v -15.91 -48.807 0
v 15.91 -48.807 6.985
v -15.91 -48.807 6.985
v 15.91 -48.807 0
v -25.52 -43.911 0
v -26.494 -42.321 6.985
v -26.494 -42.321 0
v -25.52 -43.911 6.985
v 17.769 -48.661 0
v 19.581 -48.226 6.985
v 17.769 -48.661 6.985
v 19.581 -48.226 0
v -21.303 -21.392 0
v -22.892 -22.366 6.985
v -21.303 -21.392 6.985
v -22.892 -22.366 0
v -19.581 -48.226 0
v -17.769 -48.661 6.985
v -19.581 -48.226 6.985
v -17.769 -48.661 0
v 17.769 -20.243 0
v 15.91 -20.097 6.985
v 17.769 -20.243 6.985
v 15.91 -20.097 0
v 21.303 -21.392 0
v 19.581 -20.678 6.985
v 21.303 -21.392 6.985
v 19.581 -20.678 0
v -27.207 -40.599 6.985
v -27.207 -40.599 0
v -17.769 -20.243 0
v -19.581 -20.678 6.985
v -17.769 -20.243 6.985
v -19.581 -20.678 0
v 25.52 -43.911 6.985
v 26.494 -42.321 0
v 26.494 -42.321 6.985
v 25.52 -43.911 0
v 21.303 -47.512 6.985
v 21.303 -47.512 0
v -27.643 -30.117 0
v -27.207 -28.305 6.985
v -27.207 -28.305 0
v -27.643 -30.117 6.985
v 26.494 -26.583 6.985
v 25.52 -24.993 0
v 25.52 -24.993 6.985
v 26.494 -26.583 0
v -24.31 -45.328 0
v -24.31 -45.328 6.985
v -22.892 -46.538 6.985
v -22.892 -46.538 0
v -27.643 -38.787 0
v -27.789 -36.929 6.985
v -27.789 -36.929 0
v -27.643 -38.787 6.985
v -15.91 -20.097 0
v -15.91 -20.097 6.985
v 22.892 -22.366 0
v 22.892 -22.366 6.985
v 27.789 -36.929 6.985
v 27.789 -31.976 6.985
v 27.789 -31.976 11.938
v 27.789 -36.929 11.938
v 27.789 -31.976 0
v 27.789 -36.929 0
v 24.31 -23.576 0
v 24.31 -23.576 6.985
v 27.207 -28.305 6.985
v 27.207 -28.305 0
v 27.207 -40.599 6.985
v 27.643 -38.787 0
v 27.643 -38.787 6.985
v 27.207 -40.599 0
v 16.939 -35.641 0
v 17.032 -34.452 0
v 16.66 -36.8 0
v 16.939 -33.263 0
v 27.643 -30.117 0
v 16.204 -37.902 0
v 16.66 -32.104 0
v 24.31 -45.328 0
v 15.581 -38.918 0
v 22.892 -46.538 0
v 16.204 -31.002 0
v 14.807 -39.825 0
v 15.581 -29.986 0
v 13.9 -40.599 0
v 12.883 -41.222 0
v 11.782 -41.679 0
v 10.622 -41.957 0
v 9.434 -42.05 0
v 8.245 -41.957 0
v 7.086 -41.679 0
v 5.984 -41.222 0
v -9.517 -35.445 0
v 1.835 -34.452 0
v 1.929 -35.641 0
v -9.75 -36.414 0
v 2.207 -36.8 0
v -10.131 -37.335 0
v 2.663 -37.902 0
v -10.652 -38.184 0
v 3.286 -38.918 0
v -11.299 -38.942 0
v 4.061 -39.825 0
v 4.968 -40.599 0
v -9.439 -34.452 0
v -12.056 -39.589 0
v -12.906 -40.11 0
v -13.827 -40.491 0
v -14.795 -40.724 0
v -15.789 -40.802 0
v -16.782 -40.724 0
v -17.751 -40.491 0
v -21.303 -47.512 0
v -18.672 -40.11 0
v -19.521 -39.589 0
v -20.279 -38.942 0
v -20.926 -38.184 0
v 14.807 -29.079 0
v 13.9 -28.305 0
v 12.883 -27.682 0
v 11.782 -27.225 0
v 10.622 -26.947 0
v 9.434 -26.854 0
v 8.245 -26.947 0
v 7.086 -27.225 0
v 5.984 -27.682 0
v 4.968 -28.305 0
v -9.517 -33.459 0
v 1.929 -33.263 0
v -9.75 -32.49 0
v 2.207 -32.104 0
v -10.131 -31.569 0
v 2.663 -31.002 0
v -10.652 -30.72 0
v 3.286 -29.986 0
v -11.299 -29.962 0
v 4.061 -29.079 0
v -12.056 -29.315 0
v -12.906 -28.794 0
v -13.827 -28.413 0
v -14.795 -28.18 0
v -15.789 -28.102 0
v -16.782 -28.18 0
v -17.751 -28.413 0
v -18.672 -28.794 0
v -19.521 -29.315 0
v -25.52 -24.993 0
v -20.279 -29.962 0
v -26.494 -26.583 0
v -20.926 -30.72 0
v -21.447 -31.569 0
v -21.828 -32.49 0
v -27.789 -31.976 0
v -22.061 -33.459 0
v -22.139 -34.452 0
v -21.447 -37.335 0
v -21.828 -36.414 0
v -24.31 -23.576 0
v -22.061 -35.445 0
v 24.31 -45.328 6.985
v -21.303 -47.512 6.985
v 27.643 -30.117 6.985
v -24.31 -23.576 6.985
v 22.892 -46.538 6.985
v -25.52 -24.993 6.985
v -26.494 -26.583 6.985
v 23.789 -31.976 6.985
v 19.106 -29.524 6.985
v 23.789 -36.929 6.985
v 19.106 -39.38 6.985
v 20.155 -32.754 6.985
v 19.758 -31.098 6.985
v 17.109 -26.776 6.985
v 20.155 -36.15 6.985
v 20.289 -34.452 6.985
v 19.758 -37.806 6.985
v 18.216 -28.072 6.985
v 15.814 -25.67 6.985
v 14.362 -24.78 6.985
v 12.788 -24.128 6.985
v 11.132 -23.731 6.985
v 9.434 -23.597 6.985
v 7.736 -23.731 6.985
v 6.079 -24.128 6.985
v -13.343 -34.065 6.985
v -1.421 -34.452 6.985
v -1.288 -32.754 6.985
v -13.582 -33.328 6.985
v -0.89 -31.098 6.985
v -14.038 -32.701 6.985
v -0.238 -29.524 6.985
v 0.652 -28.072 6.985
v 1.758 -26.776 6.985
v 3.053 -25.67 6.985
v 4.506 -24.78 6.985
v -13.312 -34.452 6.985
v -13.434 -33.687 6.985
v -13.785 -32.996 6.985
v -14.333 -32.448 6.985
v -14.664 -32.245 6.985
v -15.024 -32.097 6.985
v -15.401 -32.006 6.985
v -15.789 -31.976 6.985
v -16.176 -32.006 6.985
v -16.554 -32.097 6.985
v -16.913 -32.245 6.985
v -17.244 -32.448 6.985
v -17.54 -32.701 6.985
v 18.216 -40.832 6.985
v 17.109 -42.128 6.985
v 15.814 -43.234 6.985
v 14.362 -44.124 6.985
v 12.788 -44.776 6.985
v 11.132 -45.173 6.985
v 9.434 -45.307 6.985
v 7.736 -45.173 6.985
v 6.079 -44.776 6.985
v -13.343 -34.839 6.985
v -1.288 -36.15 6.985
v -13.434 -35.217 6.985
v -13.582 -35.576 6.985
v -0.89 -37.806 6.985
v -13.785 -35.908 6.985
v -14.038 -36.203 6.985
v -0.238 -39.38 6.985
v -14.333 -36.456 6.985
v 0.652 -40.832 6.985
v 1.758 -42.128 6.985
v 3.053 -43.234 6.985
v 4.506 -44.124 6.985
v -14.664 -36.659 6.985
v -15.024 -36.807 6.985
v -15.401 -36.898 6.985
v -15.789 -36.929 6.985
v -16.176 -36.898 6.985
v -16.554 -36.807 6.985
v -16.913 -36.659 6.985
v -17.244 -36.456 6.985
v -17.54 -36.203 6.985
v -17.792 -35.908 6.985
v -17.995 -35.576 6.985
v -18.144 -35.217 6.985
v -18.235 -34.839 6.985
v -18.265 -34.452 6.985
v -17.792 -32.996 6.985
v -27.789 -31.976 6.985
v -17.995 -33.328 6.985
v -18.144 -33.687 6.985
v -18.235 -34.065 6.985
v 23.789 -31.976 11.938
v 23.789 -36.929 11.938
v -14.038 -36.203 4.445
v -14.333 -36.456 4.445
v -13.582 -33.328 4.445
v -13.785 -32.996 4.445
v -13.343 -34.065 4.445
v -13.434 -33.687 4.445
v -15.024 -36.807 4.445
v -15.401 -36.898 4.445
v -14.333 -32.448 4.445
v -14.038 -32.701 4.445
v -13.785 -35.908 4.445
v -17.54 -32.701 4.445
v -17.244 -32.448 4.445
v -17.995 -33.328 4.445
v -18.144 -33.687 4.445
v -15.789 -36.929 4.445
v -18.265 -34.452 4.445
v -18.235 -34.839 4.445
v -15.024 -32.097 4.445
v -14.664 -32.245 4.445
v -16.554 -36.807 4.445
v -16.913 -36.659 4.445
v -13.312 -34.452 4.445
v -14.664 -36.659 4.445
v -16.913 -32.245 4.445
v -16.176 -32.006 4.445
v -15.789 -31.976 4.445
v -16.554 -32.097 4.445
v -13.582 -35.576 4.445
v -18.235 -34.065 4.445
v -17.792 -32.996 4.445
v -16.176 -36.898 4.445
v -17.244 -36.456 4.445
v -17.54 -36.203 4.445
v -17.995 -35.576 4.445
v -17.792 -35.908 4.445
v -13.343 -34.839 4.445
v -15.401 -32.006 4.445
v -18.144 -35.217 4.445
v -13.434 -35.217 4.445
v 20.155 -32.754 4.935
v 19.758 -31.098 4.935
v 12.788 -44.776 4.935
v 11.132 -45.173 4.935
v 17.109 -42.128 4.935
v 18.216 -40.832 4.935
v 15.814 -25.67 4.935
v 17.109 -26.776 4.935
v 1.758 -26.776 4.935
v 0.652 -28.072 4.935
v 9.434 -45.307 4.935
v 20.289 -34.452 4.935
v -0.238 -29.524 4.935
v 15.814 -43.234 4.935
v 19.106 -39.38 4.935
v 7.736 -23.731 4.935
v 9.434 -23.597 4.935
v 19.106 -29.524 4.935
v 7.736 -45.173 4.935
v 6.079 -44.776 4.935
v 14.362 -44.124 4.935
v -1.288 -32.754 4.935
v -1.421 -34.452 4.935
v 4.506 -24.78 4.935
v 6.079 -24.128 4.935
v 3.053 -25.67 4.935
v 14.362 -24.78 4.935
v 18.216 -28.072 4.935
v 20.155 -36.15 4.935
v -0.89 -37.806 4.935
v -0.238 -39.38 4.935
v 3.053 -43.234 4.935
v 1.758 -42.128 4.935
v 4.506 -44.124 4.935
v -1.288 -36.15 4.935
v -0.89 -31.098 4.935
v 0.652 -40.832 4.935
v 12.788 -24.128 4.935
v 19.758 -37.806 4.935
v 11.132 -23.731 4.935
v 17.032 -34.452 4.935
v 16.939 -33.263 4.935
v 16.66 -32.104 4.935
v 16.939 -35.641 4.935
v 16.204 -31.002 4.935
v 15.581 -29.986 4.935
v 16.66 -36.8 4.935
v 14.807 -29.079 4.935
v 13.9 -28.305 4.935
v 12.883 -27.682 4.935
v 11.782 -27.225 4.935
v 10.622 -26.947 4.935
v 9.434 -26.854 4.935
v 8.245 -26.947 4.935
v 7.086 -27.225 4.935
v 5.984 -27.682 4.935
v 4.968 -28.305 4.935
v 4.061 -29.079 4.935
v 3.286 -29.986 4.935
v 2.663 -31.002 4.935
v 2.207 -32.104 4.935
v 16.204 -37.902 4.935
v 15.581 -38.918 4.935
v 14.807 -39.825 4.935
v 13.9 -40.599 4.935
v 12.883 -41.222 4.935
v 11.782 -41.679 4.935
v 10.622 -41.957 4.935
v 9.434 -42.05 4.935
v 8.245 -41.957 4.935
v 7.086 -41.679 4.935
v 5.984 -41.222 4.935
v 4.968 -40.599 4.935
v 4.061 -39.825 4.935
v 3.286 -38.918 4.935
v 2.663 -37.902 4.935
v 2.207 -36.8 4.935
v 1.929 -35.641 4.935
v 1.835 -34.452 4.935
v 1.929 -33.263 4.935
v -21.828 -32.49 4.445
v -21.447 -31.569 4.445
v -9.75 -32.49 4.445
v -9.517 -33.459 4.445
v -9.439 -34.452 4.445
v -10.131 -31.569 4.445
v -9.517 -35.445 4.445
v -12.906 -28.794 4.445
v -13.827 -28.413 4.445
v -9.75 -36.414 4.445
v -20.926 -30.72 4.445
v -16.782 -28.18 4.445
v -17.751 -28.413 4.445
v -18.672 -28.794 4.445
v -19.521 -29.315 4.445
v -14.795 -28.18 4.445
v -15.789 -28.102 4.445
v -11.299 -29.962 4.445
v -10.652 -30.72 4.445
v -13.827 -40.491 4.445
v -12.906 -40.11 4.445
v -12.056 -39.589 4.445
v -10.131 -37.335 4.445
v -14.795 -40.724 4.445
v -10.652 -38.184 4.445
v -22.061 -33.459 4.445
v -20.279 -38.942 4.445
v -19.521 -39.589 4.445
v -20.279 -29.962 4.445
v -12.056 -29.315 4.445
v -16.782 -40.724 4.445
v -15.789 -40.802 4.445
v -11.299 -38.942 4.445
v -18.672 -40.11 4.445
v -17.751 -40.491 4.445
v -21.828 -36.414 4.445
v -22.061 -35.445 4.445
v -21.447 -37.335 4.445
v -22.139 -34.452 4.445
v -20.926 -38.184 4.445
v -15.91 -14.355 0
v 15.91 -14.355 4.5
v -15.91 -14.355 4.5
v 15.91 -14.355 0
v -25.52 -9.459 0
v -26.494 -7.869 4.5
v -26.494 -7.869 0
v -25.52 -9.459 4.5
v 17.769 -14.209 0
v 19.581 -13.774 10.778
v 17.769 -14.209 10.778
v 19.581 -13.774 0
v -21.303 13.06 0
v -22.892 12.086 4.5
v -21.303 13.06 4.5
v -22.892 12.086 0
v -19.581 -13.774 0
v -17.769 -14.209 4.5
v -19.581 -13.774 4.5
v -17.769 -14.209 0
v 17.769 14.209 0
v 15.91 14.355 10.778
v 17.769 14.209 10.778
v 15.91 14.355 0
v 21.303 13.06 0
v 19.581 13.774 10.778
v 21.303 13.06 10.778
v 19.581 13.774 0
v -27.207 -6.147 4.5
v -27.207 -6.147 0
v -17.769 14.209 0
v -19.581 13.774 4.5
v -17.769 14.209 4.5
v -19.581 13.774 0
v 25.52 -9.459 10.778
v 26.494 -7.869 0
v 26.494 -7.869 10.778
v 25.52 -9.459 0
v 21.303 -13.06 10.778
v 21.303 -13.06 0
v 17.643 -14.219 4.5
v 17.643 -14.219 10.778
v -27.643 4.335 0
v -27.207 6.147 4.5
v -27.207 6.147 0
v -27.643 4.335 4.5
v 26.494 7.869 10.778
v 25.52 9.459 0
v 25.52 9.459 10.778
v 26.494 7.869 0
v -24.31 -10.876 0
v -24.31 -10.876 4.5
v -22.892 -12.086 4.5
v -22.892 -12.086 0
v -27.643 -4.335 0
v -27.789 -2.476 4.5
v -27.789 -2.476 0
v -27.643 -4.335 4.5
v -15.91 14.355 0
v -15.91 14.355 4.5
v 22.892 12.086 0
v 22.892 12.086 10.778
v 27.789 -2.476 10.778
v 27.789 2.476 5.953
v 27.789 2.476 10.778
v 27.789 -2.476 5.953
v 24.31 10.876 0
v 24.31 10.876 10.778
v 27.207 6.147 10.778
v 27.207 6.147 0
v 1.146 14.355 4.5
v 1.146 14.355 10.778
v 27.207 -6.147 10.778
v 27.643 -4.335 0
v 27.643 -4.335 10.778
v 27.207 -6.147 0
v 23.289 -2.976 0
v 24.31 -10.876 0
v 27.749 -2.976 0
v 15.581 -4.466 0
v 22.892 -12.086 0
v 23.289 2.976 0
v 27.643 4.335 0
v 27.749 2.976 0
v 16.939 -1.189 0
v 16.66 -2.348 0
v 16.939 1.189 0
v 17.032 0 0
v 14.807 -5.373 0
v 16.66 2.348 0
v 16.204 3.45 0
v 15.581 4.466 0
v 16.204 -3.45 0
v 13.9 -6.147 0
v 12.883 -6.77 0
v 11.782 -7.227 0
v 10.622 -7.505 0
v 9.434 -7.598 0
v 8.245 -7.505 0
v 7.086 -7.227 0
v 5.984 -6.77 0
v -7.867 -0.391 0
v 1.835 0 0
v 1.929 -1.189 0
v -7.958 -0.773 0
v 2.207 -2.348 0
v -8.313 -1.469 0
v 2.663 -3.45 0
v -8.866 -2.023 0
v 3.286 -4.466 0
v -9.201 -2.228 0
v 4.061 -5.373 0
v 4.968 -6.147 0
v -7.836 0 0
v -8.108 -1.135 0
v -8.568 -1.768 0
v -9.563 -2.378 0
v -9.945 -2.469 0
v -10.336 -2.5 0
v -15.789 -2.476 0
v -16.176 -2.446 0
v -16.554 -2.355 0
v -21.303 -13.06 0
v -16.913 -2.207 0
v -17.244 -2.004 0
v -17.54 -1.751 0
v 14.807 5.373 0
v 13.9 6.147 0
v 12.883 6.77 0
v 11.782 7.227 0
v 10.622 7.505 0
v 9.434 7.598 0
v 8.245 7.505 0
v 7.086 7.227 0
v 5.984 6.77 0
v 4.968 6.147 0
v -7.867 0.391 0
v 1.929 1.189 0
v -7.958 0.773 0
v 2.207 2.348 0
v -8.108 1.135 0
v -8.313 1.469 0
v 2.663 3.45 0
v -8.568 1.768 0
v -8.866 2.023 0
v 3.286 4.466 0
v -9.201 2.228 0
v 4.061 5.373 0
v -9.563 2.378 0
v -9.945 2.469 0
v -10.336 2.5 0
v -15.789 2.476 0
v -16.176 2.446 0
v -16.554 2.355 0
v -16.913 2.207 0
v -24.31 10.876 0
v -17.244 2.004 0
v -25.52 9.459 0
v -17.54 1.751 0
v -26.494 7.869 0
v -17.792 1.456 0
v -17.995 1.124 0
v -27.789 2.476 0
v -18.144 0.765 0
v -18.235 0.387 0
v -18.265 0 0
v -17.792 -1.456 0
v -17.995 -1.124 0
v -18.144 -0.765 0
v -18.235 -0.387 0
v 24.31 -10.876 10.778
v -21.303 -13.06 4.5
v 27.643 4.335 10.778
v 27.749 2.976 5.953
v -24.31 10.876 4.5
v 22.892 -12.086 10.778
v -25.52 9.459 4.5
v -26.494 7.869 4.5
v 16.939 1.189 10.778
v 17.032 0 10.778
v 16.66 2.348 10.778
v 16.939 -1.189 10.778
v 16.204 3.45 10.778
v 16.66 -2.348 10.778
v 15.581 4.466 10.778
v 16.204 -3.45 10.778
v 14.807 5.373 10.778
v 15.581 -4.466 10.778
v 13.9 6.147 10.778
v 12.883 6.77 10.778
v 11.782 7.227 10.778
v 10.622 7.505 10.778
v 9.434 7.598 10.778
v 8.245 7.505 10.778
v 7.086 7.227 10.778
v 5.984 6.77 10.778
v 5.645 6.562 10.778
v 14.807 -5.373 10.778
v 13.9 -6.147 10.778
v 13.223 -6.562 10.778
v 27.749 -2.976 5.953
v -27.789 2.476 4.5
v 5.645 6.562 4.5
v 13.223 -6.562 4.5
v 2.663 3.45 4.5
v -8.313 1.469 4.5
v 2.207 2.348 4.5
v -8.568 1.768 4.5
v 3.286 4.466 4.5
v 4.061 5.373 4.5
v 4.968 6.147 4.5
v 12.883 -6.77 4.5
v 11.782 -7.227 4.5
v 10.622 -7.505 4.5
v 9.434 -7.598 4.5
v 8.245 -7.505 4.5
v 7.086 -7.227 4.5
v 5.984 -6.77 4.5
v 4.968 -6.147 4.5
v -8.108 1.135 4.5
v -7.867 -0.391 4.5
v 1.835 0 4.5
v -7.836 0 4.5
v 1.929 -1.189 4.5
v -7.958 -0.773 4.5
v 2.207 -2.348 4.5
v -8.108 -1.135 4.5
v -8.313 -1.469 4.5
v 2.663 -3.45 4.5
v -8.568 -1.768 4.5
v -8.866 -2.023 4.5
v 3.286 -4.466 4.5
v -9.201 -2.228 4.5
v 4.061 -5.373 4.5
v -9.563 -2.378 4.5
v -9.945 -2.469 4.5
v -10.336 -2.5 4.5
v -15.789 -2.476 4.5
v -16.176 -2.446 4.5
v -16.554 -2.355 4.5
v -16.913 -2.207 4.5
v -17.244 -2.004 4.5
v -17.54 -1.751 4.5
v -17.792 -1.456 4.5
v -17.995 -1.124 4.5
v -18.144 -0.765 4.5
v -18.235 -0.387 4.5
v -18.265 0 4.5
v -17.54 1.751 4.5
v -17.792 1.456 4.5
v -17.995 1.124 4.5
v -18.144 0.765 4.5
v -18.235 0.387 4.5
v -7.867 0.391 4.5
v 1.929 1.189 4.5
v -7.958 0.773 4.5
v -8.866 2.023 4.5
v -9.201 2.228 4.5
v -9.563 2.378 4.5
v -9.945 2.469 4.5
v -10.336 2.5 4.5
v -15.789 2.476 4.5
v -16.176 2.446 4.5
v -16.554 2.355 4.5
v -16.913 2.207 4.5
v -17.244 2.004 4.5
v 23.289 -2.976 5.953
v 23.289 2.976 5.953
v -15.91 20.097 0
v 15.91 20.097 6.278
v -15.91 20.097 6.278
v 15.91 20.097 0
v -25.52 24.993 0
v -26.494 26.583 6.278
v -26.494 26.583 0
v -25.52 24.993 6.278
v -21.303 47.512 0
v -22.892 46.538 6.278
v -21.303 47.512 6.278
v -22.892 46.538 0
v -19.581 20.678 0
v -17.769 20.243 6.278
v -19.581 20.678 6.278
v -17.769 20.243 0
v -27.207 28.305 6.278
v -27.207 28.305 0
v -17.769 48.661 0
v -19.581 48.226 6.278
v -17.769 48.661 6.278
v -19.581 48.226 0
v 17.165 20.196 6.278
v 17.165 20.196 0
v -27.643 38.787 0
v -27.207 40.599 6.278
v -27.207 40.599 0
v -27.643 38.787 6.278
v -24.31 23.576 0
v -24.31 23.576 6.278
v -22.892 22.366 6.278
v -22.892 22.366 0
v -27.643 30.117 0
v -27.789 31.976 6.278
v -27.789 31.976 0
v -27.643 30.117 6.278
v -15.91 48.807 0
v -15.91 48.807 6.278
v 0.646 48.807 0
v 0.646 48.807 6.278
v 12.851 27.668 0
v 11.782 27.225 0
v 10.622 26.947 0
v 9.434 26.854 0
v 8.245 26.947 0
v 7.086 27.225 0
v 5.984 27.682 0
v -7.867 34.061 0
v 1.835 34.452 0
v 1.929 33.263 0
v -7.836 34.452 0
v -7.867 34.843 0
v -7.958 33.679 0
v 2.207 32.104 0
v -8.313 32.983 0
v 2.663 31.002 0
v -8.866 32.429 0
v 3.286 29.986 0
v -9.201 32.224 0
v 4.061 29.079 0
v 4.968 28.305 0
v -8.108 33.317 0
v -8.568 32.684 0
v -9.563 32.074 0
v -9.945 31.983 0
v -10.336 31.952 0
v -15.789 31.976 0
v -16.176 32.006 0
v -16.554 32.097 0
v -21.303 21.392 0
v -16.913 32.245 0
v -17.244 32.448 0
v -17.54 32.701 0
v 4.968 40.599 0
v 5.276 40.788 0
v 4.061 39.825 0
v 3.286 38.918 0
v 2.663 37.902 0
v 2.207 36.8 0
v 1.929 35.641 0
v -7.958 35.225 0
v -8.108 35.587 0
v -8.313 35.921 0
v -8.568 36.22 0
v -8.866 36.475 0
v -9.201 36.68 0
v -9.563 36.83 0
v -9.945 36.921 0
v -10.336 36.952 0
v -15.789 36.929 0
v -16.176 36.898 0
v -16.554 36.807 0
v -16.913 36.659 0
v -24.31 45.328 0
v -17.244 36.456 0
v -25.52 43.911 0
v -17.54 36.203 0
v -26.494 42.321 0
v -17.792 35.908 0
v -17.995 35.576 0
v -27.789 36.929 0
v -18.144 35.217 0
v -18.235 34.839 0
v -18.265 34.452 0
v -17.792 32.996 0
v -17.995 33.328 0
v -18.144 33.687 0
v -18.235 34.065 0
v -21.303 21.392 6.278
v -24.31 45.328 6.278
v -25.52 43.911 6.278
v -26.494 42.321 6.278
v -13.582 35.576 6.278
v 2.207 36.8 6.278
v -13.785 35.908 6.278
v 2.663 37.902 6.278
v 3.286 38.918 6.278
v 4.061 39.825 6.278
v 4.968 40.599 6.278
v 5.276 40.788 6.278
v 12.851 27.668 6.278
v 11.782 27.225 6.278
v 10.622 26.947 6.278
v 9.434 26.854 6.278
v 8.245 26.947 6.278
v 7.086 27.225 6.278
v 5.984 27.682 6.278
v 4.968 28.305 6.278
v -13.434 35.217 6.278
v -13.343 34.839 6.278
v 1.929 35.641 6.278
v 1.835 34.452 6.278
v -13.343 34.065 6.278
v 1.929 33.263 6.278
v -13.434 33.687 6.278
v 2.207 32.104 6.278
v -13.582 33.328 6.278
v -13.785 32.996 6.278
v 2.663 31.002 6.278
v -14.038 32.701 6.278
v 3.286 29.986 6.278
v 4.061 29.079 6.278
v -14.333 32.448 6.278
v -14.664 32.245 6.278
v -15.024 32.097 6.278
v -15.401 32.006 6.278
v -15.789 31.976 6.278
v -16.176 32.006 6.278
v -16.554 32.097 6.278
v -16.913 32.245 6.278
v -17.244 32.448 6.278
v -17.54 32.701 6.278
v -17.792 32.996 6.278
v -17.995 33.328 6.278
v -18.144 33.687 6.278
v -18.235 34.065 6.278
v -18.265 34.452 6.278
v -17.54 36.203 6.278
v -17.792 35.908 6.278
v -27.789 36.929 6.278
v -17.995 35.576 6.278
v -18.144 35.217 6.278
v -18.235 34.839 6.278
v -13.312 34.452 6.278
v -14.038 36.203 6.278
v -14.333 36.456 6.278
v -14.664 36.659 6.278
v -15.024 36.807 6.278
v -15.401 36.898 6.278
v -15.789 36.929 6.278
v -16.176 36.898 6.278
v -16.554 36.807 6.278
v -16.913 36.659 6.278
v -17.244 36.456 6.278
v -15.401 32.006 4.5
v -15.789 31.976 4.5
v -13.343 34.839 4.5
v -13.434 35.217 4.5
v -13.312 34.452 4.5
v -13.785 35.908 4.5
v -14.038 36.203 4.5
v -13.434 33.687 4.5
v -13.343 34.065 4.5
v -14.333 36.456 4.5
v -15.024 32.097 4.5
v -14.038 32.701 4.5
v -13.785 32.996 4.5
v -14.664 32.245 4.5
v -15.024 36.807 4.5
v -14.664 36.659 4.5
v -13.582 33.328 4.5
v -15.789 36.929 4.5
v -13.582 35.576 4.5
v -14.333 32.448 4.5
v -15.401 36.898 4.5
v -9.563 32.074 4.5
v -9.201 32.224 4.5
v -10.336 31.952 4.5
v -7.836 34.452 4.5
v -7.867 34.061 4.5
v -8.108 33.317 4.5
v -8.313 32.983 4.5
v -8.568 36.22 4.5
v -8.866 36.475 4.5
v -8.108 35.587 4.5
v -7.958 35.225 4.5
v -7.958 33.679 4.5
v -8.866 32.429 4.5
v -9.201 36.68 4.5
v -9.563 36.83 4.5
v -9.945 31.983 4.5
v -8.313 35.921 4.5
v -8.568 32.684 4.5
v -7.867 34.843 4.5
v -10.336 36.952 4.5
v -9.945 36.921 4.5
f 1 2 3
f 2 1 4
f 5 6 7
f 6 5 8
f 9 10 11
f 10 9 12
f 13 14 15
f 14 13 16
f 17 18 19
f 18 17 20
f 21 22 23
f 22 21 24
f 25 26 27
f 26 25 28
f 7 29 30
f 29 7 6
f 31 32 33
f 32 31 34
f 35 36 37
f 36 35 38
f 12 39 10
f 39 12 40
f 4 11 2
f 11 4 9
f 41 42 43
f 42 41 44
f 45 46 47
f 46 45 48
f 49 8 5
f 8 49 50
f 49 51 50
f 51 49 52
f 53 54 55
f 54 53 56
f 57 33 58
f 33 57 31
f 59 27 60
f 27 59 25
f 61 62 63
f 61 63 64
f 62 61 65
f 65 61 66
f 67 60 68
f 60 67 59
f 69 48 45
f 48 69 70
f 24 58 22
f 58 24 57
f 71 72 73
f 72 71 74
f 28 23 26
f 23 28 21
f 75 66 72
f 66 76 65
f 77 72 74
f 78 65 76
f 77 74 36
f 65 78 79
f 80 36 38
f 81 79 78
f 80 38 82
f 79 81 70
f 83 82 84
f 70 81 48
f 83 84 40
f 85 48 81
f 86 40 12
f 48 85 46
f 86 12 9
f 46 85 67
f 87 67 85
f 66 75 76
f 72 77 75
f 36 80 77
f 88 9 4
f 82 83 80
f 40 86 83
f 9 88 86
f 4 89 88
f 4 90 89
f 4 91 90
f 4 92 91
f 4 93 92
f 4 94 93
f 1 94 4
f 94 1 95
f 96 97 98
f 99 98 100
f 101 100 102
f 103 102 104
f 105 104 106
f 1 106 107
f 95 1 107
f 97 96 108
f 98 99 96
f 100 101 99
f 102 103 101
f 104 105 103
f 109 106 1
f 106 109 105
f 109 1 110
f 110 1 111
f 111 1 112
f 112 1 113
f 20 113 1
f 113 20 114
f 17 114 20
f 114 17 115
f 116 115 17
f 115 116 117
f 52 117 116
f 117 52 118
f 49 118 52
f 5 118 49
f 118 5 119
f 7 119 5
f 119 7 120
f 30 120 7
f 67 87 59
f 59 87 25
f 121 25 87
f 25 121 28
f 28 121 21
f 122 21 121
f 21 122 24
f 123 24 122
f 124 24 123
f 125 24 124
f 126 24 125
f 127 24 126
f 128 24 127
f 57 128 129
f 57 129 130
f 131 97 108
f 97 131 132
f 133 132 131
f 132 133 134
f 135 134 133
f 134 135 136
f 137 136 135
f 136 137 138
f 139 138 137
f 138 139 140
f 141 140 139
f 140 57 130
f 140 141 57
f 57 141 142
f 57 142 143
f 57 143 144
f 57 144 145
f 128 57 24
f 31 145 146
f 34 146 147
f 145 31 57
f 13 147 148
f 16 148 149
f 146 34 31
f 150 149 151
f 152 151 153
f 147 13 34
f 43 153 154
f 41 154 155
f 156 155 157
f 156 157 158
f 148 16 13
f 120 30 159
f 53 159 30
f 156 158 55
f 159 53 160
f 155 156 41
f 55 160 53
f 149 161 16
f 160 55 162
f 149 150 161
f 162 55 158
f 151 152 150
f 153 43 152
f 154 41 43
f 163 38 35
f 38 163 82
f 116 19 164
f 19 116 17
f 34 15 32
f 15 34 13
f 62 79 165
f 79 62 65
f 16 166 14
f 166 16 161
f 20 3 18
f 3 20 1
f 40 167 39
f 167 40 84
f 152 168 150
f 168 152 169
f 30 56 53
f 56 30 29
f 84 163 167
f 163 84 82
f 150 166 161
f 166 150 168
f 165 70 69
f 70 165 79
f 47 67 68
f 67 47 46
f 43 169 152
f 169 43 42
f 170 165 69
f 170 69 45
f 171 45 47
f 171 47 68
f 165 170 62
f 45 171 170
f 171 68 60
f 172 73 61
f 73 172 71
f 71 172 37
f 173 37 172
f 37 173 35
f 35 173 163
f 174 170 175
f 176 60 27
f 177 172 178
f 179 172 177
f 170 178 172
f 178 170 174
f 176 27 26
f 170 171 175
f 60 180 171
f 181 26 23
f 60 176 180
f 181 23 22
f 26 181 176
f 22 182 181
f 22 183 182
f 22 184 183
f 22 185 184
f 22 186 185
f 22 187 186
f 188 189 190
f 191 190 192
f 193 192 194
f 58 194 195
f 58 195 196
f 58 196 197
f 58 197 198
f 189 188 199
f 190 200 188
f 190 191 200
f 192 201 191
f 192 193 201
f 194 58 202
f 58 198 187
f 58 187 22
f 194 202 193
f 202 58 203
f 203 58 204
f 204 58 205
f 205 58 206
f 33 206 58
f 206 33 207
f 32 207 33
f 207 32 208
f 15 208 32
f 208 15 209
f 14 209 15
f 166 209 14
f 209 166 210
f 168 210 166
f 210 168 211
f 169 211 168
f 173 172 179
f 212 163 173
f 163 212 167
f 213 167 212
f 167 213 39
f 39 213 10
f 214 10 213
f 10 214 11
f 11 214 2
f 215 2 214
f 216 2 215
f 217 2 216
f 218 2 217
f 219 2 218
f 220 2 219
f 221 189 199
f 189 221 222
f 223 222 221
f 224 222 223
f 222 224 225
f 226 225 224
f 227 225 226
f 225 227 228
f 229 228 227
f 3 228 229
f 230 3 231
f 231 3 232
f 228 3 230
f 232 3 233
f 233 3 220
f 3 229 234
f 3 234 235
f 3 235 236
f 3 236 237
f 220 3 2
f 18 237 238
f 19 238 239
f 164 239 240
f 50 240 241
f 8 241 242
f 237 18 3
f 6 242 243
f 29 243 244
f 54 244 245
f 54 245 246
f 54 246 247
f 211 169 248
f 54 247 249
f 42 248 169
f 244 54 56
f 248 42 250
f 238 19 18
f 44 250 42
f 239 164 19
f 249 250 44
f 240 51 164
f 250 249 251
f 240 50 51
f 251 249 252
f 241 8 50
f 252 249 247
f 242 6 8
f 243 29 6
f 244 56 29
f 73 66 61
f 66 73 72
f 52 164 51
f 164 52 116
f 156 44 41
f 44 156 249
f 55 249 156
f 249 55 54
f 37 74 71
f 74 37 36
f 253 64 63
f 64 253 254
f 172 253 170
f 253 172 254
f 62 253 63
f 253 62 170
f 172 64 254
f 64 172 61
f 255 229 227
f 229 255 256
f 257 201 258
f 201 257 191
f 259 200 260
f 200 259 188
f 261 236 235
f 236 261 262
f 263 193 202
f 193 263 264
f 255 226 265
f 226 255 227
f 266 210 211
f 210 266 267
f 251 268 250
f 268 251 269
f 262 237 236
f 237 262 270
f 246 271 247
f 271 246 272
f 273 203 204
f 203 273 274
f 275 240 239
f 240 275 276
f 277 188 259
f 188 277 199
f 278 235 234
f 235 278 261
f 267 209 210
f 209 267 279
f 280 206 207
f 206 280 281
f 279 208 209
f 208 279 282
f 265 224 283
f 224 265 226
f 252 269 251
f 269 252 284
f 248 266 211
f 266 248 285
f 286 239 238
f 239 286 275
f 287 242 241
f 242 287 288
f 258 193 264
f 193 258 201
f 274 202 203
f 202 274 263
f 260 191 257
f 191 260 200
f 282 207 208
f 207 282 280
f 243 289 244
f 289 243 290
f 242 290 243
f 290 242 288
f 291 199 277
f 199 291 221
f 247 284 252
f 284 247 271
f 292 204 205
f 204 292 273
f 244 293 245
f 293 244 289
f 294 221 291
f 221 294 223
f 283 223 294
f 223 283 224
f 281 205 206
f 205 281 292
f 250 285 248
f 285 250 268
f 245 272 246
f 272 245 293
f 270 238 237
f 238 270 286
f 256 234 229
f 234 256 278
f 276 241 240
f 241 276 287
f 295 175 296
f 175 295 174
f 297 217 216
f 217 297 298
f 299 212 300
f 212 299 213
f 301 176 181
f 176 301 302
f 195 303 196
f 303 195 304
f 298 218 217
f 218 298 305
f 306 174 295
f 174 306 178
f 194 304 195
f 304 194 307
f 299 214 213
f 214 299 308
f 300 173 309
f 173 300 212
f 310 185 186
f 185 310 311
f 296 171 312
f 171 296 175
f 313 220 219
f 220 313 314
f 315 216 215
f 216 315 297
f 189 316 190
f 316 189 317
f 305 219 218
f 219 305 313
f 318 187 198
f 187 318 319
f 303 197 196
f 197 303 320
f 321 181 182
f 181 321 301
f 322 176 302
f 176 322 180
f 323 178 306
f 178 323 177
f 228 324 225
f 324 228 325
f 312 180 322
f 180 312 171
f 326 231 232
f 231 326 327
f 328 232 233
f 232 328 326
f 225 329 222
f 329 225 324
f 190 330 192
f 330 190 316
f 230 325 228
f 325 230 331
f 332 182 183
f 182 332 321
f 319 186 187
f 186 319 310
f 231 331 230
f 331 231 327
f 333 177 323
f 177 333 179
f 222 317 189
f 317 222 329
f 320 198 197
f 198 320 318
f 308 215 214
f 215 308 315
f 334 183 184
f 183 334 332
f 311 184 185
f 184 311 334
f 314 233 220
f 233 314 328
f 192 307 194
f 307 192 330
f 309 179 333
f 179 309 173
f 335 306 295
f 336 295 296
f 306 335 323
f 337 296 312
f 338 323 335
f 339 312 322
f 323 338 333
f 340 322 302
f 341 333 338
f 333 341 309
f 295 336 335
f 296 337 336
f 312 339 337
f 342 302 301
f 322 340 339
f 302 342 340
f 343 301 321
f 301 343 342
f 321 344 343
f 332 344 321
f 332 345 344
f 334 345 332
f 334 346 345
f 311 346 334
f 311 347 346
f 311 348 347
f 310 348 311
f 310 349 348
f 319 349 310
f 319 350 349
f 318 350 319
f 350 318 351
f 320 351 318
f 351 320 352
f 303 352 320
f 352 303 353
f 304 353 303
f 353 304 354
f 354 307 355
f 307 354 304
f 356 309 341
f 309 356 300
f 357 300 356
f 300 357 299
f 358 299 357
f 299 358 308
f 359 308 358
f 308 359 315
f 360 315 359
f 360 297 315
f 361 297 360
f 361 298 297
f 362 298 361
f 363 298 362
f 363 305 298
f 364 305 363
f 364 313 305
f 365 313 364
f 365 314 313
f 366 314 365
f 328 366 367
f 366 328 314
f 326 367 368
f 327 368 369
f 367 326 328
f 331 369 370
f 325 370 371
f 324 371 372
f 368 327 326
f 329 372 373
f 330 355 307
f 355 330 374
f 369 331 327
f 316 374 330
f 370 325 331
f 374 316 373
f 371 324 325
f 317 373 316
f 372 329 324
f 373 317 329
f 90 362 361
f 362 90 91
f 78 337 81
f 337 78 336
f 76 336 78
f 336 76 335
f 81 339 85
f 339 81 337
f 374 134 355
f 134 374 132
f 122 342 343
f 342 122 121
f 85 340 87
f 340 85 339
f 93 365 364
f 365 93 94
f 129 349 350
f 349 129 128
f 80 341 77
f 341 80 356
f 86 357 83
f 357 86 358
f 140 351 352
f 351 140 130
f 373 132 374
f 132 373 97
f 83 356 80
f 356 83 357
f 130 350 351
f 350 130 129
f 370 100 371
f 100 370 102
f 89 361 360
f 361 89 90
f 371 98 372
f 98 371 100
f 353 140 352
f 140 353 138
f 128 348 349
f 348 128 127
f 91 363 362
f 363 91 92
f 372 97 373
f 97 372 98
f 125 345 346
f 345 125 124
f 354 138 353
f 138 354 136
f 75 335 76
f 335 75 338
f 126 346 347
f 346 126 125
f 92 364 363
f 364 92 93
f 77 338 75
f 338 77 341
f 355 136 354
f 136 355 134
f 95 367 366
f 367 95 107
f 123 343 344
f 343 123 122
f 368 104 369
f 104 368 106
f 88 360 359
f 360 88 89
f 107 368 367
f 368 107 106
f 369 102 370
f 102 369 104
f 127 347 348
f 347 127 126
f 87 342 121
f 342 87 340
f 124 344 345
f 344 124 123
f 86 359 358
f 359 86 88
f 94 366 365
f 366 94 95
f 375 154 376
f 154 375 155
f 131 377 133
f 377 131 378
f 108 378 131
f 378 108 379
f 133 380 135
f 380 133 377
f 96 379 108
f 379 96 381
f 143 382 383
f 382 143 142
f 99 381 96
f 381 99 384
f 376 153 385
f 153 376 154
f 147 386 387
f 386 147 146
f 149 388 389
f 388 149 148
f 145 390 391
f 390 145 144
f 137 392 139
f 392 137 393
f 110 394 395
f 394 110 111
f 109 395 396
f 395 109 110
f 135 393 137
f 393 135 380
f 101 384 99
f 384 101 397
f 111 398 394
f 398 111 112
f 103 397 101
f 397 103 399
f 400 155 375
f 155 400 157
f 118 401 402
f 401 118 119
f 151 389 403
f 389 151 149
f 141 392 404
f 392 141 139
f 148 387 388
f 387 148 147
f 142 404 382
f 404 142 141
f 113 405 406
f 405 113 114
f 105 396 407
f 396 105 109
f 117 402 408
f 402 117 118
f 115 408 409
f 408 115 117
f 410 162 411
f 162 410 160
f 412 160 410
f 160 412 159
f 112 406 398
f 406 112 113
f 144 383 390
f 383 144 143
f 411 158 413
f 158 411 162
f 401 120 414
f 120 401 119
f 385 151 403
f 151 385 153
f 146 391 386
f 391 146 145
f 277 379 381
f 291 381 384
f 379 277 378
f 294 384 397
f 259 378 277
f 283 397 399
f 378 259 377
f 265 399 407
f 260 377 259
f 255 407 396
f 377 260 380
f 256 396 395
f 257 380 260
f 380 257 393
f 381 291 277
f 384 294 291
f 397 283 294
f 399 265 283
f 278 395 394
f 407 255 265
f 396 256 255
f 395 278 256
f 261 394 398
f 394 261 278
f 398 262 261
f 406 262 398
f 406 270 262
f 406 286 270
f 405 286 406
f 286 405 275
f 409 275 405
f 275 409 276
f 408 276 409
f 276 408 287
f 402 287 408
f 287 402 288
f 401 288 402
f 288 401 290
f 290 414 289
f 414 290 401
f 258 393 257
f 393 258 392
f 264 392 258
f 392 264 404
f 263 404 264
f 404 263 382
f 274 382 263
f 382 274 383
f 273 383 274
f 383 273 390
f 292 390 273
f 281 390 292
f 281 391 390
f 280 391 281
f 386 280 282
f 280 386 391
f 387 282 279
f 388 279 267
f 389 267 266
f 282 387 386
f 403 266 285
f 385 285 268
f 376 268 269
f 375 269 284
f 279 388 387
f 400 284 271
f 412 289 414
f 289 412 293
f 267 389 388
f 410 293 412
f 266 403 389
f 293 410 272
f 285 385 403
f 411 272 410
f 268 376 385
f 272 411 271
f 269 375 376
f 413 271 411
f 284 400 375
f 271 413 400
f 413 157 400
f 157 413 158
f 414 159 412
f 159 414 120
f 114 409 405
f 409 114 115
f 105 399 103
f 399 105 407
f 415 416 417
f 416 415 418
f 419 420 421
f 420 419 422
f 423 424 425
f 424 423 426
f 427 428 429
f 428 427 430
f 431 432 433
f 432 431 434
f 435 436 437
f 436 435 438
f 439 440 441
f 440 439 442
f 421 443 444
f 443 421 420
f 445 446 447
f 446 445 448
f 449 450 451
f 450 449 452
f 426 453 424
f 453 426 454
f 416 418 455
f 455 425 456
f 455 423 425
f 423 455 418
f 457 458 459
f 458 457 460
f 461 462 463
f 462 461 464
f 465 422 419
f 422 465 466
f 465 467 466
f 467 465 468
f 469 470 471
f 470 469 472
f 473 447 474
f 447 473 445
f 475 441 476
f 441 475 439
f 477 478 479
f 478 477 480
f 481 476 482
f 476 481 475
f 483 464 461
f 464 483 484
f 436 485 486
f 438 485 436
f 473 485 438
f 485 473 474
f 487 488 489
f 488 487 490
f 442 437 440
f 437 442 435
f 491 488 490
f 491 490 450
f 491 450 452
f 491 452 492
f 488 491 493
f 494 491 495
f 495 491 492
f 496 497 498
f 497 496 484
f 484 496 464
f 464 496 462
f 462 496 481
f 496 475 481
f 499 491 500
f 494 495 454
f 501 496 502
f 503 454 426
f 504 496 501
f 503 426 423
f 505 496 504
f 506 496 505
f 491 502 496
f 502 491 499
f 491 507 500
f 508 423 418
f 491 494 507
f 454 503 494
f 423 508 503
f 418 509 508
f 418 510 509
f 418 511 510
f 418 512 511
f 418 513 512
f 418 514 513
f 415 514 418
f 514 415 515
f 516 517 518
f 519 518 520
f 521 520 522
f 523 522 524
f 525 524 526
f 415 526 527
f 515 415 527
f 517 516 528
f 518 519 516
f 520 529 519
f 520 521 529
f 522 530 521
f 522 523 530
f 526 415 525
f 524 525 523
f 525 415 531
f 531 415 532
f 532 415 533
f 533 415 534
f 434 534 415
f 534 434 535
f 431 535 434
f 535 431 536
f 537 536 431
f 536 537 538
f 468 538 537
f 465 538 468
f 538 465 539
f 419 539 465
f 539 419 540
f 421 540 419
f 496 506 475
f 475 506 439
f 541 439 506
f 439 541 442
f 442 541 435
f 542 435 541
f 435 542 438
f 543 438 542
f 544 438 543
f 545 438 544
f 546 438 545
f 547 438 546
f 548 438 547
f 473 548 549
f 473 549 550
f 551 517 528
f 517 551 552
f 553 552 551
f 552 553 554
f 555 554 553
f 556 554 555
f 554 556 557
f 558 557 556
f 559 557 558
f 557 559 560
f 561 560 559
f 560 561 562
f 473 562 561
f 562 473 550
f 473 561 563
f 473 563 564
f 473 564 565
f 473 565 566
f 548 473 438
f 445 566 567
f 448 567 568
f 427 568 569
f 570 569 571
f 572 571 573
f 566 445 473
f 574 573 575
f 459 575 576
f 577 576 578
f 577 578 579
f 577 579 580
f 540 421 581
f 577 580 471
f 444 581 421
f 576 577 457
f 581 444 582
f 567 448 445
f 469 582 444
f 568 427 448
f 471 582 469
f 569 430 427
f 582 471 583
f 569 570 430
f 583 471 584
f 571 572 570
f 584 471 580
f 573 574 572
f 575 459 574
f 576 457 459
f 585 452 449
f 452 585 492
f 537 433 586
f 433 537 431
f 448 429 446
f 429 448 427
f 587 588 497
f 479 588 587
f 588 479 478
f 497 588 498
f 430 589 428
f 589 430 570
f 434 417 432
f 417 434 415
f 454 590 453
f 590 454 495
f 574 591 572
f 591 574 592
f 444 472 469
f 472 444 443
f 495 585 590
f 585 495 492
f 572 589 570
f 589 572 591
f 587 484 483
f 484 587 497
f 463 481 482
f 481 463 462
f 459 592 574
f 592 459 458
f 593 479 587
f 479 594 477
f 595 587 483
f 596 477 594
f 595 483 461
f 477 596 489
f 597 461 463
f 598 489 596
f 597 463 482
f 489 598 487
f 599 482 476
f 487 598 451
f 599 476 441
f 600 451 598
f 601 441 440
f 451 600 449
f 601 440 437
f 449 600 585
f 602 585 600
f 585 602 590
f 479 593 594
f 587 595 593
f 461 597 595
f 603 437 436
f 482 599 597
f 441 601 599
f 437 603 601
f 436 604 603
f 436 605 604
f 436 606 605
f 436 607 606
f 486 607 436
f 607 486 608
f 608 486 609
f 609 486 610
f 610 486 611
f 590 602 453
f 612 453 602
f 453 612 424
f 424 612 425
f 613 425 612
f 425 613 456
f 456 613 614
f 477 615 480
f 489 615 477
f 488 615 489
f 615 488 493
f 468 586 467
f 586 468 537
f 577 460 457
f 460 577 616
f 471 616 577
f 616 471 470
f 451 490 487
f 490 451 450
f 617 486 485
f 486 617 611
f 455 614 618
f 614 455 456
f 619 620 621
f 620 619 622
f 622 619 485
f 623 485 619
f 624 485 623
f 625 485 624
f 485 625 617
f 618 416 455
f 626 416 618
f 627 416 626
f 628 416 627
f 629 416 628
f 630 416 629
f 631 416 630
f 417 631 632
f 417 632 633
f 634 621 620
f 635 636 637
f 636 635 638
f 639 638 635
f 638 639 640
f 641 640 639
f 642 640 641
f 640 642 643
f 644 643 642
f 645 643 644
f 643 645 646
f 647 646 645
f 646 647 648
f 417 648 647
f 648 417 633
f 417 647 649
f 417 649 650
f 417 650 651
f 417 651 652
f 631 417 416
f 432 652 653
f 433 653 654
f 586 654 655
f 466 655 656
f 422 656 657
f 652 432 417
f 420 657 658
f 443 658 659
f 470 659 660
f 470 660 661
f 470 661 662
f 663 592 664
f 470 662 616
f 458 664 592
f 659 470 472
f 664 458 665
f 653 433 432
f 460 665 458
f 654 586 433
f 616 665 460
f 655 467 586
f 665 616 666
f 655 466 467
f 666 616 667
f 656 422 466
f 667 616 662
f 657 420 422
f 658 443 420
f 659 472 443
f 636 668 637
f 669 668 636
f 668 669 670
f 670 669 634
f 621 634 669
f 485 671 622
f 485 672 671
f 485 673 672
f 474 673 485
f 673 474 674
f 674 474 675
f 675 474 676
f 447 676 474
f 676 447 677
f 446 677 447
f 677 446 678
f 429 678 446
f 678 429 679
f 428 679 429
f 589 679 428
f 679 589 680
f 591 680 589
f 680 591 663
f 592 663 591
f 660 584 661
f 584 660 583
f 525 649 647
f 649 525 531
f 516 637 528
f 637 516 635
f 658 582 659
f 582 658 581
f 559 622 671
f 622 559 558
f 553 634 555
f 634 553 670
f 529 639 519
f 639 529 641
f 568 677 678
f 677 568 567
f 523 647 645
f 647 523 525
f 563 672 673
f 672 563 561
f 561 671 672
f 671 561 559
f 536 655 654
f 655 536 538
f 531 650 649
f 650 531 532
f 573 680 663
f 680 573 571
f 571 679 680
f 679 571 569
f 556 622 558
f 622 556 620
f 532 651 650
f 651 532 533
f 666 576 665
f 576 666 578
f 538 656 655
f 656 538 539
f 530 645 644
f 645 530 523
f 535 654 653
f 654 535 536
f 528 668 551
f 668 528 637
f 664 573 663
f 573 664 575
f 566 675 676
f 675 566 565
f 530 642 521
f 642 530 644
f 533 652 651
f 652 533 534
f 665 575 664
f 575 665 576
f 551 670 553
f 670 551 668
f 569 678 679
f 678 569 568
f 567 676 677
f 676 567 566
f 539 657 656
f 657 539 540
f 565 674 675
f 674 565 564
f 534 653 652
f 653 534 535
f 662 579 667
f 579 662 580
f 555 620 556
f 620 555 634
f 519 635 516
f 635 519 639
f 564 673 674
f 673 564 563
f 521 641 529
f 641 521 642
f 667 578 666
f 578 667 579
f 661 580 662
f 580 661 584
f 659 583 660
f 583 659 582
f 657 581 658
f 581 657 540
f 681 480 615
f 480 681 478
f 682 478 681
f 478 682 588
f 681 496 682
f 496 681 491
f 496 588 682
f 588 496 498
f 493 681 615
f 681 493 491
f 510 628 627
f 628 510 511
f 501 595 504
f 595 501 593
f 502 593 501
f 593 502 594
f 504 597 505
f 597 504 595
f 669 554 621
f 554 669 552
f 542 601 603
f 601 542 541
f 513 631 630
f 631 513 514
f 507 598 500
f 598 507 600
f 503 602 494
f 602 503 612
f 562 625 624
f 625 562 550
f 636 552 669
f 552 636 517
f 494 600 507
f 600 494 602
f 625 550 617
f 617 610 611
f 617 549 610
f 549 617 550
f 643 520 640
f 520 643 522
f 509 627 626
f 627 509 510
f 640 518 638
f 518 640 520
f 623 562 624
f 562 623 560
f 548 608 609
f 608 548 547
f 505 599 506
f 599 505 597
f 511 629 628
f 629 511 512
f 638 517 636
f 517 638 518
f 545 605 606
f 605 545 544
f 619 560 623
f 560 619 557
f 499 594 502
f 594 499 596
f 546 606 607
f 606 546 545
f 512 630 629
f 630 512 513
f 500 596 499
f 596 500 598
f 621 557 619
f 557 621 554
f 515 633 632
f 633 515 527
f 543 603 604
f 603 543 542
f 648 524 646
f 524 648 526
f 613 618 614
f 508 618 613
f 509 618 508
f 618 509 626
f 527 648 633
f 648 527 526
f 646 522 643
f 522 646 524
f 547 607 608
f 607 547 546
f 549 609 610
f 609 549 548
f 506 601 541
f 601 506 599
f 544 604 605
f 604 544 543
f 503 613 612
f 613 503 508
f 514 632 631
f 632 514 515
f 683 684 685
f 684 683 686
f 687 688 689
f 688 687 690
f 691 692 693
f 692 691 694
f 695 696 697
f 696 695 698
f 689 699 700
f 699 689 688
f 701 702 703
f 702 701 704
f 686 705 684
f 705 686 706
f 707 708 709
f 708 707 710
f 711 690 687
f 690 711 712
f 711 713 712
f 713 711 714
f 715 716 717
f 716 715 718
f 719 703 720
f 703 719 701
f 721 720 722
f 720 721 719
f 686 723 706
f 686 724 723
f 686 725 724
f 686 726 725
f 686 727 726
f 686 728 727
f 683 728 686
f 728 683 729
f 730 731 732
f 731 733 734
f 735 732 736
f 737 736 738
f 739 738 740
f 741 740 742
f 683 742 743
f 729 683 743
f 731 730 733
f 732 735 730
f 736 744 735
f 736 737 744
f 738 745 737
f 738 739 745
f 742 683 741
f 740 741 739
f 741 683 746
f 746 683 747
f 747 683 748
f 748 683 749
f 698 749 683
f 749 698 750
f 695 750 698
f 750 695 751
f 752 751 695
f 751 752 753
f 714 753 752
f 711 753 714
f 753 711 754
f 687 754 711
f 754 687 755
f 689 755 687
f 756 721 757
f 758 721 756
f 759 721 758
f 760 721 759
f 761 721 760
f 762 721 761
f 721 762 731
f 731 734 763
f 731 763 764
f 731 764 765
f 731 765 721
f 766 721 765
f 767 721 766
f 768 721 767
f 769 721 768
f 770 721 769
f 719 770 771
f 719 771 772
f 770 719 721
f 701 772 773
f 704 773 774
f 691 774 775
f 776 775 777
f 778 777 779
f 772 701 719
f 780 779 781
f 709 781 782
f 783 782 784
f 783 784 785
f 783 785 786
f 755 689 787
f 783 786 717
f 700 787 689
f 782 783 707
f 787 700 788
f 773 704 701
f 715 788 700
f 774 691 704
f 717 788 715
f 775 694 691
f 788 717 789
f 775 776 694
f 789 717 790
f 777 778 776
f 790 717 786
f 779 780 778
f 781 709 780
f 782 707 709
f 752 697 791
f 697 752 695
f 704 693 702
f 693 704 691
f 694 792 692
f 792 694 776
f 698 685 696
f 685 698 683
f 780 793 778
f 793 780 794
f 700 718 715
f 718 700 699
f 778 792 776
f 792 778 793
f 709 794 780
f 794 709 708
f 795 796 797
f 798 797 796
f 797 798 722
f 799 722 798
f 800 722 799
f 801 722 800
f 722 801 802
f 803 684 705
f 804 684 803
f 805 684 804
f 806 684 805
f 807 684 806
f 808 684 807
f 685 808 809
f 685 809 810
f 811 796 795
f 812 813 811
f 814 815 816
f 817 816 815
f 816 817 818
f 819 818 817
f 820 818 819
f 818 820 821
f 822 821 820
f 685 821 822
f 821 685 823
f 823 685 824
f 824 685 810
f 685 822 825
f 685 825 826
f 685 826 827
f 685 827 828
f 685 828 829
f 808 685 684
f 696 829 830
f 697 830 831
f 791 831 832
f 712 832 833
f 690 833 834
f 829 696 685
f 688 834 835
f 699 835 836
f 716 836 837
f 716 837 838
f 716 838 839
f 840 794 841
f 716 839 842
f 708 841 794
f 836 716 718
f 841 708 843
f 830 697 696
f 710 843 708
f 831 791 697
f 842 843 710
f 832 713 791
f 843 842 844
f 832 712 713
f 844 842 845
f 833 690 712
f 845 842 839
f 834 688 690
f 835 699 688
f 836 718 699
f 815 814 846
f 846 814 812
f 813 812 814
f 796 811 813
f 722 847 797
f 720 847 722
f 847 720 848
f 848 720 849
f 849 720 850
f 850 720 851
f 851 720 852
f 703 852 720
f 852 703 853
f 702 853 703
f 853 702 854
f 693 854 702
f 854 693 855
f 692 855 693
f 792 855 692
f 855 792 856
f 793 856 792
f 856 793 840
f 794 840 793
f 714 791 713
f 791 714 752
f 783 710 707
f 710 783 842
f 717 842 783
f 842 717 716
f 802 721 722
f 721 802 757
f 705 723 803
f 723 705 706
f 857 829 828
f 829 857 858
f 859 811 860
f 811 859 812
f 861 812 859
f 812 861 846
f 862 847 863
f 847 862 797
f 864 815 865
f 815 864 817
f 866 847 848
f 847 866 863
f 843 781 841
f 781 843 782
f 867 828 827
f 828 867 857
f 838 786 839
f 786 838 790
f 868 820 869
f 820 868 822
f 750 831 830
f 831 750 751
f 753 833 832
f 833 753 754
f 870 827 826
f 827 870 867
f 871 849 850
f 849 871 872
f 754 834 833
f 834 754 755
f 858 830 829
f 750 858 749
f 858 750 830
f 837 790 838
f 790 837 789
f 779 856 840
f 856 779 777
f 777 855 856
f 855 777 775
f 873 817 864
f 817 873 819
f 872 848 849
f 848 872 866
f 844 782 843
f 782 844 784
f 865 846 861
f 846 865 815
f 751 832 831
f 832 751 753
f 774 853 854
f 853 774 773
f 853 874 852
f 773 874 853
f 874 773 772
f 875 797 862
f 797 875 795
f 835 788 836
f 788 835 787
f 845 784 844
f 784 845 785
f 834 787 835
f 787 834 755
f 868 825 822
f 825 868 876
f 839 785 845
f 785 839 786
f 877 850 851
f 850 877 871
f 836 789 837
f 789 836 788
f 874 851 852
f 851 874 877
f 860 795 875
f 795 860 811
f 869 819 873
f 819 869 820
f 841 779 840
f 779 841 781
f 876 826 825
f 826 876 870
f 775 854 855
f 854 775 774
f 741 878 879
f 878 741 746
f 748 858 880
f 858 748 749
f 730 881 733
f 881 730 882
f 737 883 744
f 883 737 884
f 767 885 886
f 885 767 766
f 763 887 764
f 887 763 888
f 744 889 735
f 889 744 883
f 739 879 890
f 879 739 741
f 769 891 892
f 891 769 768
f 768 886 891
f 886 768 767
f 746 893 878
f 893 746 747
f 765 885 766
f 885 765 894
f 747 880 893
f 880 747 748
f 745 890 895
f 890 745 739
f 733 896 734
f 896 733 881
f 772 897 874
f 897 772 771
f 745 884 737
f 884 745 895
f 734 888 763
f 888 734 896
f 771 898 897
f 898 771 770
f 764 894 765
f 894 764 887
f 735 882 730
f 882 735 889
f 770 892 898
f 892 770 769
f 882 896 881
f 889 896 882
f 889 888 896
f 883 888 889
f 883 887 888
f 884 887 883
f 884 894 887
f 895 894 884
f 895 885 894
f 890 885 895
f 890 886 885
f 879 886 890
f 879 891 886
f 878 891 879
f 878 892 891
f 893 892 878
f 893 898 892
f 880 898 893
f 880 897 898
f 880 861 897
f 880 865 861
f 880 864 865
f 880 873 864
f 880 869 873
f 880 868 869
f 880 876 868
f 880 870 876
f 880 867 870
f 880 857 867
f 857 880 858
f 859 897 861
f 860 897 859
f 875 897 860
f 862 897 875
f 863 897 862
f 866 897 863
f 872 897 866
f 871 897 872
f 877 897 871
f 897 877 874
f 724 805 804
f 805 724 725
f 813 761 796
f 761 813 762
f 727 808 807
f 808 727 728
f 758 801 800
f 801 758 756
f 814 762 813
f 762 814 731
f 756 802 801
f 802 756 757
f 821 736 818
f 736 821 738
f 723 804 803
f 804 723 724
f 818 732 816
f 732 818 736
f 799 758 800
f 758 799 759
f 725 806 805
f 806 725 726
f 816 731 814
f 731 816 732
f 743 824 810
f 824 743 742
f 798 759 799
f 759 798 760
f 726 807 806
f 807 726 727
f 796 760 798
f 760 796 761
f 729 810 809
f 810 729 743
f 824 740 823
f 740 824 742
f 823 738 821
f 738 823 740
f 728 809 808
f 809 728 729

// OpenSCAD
// Puzzle box
$fn=40;
in=25.4;
gap=.5;


show_explode = 0;   //set to 1 to show the exploded view
show_print = 1;     //set to 1 to build the printable model
show_ball_mold = 0; //set to 1 to build the ball mold (hot glue ball)



Dpin=.195*in;     // Diameter of screw 
D_ball=4;         // Diameter of ball
//D_ball=6;
//D_ball=8;


coin_diameter      = 21.21;   // Diameter of US Nickel 21.21 mm
                       // Diameter of US Dollar Gold 26.49 mm
coin_thickness = 1.95;  // Thickness of US Nickel 1.95 mm
                     // Depth of US Dollar Gold 2 mm
                     
// Pad the cutouts a smidgen
Dcavity = coin_diameter + .5;
depth_cavity = coin_thickness + .1;

////////////////////////////////////////////////////////////////////////

H_ball_pocket=D_ball+gap;

padding = 3.5;
width = Dcavity + 2 * padding;
length=Dcavity * 2.56;

D_CB=.5*in;
H_CB=.175*in;

Htop=H_ball_pocket+.07*in;
Hmiddle=H_ball_pocket+Htop;
Hbottom=H_CB+.1*in; //10


angle=60;
Dtap=Dpin; //.15*in is the tap drill size if you want to tap the plastic;
Xhole=12;
Lslot=Dpin/2+max(D_ball,Dpin)/2+gap;

Xcavity=width;

Dcavity_through= .7 * Dcavity;
tcavity=Hbottom-depth_cavity;
wx=50;


Wkey=Dpin;
Lkey=min(Dpin,D_ball);
radius=(width-Wkey)/2;

WkeyG=Wkey+2*gap;
D_ball_hole=D_ball+2*gap;

LkeyG=Lkey+gap;
Xcoin = (length - Dcavity) / 2 - Lkey - padding;


if (show_explode)
{
    explode_dist=20;
    Bottom_Part(explode_dist);
    Middle_Part(explode_dist);
    Top_Part(explode_dist);
}

if (show_print)
{
    translate([0,-width*1.2,0]) Bottom_Part();
    translate([0,0,-Hbottom]) Middle_Part();
    translate([0,width*1.2,-Hmiddle-Hbottom+Htop]) Top_Part();
}

if (show_ball_mold)
{
    Ball_mold();
    rotate([0,0,180])Ball_mold();
}

module Ball_mold(explode=0)
{
    Dnozzle=.4;
    Wmold=D_ball*3;
    Hmold=D_ball/2*1.5;
    hpin=D_ball/2;
    D_trough=D_ball/2;
    g=.2;
    
    translate([Wmold,0,Hmold])
    {
        rotate([180,0,0])
        {
            difference()
            {
                translate([0,0,Hmold/2]) cube([Wmold,Wmold,Hmold],center=true);
                sphere(d=D_ball);
                rotate_extrude()
                {
                    translate([D_ball/2+D_trough/2+Dnozzle,0])circle(d=D_trough);
                }
                translate([ Wmold/2*.7, Wmold/2*.7,0])
                    cylinder(d1=D_ball/2+g,d2=Dnozzle+g,h=hpin+g);
                rotate([0,90,0])
                    translate([0,0,D_ball/2+D_trough/2+Dnozzle])
                        cylinder(d=D_trough,h=Wmold);
                rotate([0,-90,0])
                    translate([0,0,D_ball/2+D_trough/2+Dnozzle])
                        cylinder(d=D_trough,h=Wmold);
                rotate([90,0,0])
                    translate([0,0,D_ball/2+D_trough/2+Dnozzle])
                        cylinder(d=D_trough,h=Wmold);
                rotate([-90,0,0])
                    translate([0,0,D_ball/2+D_trough/2+Dnozzle])
                        cylinder(d=D_trough,h=Wmold);
            }
            
            translate([-Wmold/2*.7,-Wmold/2*.7,-hpin])
                cylinder(d2=D_ball/2,d1=Dnozzle,h=hpin);
        }
    }
}



module Bottom_Part(explode=0)
{
    difference()
    {
        union()
        {
            box(length,width,Hbottom,radius);
            translate([length/2-Lkey/2,0,Hbottom])
                cube([Lkey,Wkey,Wkey*2],center=true);
        }
        translate([-length/2+Xhole,0,0])
                    cylinder(d=Dtap,h=Hbottom*2,center=true);
        translate([Xcoin,0,tcavity])
                    cylinder(d=Dcavity,h=Hbottom*2,center=false);
        translate([Xcoin,0,0])
            cylinder(d=Dcavity_through,h=Hbottom*2,center=true);
        translate([-length/2+Xhole,0,0])
                    cylinder(d=D_CB,h=H_CB*2,center=true);
    }
    
}

module Middle_Part(explode=0)
{
    color("blue")
    translate([0,0,Hbottom+explode])
    {
        difference()
        {
            box(length,width,Hmiddle,radius);
            
            translate([Xcoin,0,Hmiddle-Htop])
                    rotate([0,0,90-angle])
                        translate([-length,-width/2*wx,0])
                            cube([length,width*wx,Htop],center=false);            
            hull()
                {
                translate([-length/2+Xhole,0,0])
                    cylinder(d=Dpin,h=Hmiddle*2,center=true);
                translate([-length/2+Xhole+Lslot,0,0])
                    cylinder(d=max(D_ball_hole,Dpin),h=Hmiddle*2,center=true);

                }
                
            translate([length/2,0,0])
                cube([LkeyG*2,WkeyG,WkeyG*2],center=true);

            translate([Xcoin,0,0])
                    cylinder(d=Dcavity_through,h=Hmiddle*2,center=true);
                
        }
    }
}


module Top_Part(explode=0)
{
    color("red")
        translate([0,0,Hbottom+Hmiddle-Htop+explode+explode])
        {
            difference()
            {
                box(length,width,Htop,radius);                
                translate([Xcoin - gap,0,0])
                    rotate([0,0,(90-angle)])
                        translate([0,-width/2*wx,0])
                            cube([length,width*wx,Htop],center=false);
                
                
                translate([-length/2+Xhole,0,0])
                    cylinder(d=Dpin,h=Htop*2,center=true);
                
                hull()
                {
                    translate([-length/2+Xhole,0,0])
                        cylinder(d=Dpin,h=H_ball_pocket*2,center=true);
                    translate([-length/2+Xhole+Lslot,0,0])
                        cylinder(d=max(D_ball_hole,Dpin),h=H_ball_pocket*2,center=true);
                }
                
                translate([Xcoin,0,0])
                    cylinder(d=Dcavity_through,h=Htop*2,center=true);
            }  
    }
}


module box(L,W,H,R)
{
    hull()
    {
        translate([-L/2+R,-W/2+R,0])cylinder(r=R,h=H);
        translate([-L/2+R,W/2-R,0])cylinder(r=R,h=H);
        translate([L/2-R,-W/2+R,0])cylinder(r=R,h=H);
        translate([L/2-R,W/2-R,0])cylinder(r=R,h=H);
    }
}
